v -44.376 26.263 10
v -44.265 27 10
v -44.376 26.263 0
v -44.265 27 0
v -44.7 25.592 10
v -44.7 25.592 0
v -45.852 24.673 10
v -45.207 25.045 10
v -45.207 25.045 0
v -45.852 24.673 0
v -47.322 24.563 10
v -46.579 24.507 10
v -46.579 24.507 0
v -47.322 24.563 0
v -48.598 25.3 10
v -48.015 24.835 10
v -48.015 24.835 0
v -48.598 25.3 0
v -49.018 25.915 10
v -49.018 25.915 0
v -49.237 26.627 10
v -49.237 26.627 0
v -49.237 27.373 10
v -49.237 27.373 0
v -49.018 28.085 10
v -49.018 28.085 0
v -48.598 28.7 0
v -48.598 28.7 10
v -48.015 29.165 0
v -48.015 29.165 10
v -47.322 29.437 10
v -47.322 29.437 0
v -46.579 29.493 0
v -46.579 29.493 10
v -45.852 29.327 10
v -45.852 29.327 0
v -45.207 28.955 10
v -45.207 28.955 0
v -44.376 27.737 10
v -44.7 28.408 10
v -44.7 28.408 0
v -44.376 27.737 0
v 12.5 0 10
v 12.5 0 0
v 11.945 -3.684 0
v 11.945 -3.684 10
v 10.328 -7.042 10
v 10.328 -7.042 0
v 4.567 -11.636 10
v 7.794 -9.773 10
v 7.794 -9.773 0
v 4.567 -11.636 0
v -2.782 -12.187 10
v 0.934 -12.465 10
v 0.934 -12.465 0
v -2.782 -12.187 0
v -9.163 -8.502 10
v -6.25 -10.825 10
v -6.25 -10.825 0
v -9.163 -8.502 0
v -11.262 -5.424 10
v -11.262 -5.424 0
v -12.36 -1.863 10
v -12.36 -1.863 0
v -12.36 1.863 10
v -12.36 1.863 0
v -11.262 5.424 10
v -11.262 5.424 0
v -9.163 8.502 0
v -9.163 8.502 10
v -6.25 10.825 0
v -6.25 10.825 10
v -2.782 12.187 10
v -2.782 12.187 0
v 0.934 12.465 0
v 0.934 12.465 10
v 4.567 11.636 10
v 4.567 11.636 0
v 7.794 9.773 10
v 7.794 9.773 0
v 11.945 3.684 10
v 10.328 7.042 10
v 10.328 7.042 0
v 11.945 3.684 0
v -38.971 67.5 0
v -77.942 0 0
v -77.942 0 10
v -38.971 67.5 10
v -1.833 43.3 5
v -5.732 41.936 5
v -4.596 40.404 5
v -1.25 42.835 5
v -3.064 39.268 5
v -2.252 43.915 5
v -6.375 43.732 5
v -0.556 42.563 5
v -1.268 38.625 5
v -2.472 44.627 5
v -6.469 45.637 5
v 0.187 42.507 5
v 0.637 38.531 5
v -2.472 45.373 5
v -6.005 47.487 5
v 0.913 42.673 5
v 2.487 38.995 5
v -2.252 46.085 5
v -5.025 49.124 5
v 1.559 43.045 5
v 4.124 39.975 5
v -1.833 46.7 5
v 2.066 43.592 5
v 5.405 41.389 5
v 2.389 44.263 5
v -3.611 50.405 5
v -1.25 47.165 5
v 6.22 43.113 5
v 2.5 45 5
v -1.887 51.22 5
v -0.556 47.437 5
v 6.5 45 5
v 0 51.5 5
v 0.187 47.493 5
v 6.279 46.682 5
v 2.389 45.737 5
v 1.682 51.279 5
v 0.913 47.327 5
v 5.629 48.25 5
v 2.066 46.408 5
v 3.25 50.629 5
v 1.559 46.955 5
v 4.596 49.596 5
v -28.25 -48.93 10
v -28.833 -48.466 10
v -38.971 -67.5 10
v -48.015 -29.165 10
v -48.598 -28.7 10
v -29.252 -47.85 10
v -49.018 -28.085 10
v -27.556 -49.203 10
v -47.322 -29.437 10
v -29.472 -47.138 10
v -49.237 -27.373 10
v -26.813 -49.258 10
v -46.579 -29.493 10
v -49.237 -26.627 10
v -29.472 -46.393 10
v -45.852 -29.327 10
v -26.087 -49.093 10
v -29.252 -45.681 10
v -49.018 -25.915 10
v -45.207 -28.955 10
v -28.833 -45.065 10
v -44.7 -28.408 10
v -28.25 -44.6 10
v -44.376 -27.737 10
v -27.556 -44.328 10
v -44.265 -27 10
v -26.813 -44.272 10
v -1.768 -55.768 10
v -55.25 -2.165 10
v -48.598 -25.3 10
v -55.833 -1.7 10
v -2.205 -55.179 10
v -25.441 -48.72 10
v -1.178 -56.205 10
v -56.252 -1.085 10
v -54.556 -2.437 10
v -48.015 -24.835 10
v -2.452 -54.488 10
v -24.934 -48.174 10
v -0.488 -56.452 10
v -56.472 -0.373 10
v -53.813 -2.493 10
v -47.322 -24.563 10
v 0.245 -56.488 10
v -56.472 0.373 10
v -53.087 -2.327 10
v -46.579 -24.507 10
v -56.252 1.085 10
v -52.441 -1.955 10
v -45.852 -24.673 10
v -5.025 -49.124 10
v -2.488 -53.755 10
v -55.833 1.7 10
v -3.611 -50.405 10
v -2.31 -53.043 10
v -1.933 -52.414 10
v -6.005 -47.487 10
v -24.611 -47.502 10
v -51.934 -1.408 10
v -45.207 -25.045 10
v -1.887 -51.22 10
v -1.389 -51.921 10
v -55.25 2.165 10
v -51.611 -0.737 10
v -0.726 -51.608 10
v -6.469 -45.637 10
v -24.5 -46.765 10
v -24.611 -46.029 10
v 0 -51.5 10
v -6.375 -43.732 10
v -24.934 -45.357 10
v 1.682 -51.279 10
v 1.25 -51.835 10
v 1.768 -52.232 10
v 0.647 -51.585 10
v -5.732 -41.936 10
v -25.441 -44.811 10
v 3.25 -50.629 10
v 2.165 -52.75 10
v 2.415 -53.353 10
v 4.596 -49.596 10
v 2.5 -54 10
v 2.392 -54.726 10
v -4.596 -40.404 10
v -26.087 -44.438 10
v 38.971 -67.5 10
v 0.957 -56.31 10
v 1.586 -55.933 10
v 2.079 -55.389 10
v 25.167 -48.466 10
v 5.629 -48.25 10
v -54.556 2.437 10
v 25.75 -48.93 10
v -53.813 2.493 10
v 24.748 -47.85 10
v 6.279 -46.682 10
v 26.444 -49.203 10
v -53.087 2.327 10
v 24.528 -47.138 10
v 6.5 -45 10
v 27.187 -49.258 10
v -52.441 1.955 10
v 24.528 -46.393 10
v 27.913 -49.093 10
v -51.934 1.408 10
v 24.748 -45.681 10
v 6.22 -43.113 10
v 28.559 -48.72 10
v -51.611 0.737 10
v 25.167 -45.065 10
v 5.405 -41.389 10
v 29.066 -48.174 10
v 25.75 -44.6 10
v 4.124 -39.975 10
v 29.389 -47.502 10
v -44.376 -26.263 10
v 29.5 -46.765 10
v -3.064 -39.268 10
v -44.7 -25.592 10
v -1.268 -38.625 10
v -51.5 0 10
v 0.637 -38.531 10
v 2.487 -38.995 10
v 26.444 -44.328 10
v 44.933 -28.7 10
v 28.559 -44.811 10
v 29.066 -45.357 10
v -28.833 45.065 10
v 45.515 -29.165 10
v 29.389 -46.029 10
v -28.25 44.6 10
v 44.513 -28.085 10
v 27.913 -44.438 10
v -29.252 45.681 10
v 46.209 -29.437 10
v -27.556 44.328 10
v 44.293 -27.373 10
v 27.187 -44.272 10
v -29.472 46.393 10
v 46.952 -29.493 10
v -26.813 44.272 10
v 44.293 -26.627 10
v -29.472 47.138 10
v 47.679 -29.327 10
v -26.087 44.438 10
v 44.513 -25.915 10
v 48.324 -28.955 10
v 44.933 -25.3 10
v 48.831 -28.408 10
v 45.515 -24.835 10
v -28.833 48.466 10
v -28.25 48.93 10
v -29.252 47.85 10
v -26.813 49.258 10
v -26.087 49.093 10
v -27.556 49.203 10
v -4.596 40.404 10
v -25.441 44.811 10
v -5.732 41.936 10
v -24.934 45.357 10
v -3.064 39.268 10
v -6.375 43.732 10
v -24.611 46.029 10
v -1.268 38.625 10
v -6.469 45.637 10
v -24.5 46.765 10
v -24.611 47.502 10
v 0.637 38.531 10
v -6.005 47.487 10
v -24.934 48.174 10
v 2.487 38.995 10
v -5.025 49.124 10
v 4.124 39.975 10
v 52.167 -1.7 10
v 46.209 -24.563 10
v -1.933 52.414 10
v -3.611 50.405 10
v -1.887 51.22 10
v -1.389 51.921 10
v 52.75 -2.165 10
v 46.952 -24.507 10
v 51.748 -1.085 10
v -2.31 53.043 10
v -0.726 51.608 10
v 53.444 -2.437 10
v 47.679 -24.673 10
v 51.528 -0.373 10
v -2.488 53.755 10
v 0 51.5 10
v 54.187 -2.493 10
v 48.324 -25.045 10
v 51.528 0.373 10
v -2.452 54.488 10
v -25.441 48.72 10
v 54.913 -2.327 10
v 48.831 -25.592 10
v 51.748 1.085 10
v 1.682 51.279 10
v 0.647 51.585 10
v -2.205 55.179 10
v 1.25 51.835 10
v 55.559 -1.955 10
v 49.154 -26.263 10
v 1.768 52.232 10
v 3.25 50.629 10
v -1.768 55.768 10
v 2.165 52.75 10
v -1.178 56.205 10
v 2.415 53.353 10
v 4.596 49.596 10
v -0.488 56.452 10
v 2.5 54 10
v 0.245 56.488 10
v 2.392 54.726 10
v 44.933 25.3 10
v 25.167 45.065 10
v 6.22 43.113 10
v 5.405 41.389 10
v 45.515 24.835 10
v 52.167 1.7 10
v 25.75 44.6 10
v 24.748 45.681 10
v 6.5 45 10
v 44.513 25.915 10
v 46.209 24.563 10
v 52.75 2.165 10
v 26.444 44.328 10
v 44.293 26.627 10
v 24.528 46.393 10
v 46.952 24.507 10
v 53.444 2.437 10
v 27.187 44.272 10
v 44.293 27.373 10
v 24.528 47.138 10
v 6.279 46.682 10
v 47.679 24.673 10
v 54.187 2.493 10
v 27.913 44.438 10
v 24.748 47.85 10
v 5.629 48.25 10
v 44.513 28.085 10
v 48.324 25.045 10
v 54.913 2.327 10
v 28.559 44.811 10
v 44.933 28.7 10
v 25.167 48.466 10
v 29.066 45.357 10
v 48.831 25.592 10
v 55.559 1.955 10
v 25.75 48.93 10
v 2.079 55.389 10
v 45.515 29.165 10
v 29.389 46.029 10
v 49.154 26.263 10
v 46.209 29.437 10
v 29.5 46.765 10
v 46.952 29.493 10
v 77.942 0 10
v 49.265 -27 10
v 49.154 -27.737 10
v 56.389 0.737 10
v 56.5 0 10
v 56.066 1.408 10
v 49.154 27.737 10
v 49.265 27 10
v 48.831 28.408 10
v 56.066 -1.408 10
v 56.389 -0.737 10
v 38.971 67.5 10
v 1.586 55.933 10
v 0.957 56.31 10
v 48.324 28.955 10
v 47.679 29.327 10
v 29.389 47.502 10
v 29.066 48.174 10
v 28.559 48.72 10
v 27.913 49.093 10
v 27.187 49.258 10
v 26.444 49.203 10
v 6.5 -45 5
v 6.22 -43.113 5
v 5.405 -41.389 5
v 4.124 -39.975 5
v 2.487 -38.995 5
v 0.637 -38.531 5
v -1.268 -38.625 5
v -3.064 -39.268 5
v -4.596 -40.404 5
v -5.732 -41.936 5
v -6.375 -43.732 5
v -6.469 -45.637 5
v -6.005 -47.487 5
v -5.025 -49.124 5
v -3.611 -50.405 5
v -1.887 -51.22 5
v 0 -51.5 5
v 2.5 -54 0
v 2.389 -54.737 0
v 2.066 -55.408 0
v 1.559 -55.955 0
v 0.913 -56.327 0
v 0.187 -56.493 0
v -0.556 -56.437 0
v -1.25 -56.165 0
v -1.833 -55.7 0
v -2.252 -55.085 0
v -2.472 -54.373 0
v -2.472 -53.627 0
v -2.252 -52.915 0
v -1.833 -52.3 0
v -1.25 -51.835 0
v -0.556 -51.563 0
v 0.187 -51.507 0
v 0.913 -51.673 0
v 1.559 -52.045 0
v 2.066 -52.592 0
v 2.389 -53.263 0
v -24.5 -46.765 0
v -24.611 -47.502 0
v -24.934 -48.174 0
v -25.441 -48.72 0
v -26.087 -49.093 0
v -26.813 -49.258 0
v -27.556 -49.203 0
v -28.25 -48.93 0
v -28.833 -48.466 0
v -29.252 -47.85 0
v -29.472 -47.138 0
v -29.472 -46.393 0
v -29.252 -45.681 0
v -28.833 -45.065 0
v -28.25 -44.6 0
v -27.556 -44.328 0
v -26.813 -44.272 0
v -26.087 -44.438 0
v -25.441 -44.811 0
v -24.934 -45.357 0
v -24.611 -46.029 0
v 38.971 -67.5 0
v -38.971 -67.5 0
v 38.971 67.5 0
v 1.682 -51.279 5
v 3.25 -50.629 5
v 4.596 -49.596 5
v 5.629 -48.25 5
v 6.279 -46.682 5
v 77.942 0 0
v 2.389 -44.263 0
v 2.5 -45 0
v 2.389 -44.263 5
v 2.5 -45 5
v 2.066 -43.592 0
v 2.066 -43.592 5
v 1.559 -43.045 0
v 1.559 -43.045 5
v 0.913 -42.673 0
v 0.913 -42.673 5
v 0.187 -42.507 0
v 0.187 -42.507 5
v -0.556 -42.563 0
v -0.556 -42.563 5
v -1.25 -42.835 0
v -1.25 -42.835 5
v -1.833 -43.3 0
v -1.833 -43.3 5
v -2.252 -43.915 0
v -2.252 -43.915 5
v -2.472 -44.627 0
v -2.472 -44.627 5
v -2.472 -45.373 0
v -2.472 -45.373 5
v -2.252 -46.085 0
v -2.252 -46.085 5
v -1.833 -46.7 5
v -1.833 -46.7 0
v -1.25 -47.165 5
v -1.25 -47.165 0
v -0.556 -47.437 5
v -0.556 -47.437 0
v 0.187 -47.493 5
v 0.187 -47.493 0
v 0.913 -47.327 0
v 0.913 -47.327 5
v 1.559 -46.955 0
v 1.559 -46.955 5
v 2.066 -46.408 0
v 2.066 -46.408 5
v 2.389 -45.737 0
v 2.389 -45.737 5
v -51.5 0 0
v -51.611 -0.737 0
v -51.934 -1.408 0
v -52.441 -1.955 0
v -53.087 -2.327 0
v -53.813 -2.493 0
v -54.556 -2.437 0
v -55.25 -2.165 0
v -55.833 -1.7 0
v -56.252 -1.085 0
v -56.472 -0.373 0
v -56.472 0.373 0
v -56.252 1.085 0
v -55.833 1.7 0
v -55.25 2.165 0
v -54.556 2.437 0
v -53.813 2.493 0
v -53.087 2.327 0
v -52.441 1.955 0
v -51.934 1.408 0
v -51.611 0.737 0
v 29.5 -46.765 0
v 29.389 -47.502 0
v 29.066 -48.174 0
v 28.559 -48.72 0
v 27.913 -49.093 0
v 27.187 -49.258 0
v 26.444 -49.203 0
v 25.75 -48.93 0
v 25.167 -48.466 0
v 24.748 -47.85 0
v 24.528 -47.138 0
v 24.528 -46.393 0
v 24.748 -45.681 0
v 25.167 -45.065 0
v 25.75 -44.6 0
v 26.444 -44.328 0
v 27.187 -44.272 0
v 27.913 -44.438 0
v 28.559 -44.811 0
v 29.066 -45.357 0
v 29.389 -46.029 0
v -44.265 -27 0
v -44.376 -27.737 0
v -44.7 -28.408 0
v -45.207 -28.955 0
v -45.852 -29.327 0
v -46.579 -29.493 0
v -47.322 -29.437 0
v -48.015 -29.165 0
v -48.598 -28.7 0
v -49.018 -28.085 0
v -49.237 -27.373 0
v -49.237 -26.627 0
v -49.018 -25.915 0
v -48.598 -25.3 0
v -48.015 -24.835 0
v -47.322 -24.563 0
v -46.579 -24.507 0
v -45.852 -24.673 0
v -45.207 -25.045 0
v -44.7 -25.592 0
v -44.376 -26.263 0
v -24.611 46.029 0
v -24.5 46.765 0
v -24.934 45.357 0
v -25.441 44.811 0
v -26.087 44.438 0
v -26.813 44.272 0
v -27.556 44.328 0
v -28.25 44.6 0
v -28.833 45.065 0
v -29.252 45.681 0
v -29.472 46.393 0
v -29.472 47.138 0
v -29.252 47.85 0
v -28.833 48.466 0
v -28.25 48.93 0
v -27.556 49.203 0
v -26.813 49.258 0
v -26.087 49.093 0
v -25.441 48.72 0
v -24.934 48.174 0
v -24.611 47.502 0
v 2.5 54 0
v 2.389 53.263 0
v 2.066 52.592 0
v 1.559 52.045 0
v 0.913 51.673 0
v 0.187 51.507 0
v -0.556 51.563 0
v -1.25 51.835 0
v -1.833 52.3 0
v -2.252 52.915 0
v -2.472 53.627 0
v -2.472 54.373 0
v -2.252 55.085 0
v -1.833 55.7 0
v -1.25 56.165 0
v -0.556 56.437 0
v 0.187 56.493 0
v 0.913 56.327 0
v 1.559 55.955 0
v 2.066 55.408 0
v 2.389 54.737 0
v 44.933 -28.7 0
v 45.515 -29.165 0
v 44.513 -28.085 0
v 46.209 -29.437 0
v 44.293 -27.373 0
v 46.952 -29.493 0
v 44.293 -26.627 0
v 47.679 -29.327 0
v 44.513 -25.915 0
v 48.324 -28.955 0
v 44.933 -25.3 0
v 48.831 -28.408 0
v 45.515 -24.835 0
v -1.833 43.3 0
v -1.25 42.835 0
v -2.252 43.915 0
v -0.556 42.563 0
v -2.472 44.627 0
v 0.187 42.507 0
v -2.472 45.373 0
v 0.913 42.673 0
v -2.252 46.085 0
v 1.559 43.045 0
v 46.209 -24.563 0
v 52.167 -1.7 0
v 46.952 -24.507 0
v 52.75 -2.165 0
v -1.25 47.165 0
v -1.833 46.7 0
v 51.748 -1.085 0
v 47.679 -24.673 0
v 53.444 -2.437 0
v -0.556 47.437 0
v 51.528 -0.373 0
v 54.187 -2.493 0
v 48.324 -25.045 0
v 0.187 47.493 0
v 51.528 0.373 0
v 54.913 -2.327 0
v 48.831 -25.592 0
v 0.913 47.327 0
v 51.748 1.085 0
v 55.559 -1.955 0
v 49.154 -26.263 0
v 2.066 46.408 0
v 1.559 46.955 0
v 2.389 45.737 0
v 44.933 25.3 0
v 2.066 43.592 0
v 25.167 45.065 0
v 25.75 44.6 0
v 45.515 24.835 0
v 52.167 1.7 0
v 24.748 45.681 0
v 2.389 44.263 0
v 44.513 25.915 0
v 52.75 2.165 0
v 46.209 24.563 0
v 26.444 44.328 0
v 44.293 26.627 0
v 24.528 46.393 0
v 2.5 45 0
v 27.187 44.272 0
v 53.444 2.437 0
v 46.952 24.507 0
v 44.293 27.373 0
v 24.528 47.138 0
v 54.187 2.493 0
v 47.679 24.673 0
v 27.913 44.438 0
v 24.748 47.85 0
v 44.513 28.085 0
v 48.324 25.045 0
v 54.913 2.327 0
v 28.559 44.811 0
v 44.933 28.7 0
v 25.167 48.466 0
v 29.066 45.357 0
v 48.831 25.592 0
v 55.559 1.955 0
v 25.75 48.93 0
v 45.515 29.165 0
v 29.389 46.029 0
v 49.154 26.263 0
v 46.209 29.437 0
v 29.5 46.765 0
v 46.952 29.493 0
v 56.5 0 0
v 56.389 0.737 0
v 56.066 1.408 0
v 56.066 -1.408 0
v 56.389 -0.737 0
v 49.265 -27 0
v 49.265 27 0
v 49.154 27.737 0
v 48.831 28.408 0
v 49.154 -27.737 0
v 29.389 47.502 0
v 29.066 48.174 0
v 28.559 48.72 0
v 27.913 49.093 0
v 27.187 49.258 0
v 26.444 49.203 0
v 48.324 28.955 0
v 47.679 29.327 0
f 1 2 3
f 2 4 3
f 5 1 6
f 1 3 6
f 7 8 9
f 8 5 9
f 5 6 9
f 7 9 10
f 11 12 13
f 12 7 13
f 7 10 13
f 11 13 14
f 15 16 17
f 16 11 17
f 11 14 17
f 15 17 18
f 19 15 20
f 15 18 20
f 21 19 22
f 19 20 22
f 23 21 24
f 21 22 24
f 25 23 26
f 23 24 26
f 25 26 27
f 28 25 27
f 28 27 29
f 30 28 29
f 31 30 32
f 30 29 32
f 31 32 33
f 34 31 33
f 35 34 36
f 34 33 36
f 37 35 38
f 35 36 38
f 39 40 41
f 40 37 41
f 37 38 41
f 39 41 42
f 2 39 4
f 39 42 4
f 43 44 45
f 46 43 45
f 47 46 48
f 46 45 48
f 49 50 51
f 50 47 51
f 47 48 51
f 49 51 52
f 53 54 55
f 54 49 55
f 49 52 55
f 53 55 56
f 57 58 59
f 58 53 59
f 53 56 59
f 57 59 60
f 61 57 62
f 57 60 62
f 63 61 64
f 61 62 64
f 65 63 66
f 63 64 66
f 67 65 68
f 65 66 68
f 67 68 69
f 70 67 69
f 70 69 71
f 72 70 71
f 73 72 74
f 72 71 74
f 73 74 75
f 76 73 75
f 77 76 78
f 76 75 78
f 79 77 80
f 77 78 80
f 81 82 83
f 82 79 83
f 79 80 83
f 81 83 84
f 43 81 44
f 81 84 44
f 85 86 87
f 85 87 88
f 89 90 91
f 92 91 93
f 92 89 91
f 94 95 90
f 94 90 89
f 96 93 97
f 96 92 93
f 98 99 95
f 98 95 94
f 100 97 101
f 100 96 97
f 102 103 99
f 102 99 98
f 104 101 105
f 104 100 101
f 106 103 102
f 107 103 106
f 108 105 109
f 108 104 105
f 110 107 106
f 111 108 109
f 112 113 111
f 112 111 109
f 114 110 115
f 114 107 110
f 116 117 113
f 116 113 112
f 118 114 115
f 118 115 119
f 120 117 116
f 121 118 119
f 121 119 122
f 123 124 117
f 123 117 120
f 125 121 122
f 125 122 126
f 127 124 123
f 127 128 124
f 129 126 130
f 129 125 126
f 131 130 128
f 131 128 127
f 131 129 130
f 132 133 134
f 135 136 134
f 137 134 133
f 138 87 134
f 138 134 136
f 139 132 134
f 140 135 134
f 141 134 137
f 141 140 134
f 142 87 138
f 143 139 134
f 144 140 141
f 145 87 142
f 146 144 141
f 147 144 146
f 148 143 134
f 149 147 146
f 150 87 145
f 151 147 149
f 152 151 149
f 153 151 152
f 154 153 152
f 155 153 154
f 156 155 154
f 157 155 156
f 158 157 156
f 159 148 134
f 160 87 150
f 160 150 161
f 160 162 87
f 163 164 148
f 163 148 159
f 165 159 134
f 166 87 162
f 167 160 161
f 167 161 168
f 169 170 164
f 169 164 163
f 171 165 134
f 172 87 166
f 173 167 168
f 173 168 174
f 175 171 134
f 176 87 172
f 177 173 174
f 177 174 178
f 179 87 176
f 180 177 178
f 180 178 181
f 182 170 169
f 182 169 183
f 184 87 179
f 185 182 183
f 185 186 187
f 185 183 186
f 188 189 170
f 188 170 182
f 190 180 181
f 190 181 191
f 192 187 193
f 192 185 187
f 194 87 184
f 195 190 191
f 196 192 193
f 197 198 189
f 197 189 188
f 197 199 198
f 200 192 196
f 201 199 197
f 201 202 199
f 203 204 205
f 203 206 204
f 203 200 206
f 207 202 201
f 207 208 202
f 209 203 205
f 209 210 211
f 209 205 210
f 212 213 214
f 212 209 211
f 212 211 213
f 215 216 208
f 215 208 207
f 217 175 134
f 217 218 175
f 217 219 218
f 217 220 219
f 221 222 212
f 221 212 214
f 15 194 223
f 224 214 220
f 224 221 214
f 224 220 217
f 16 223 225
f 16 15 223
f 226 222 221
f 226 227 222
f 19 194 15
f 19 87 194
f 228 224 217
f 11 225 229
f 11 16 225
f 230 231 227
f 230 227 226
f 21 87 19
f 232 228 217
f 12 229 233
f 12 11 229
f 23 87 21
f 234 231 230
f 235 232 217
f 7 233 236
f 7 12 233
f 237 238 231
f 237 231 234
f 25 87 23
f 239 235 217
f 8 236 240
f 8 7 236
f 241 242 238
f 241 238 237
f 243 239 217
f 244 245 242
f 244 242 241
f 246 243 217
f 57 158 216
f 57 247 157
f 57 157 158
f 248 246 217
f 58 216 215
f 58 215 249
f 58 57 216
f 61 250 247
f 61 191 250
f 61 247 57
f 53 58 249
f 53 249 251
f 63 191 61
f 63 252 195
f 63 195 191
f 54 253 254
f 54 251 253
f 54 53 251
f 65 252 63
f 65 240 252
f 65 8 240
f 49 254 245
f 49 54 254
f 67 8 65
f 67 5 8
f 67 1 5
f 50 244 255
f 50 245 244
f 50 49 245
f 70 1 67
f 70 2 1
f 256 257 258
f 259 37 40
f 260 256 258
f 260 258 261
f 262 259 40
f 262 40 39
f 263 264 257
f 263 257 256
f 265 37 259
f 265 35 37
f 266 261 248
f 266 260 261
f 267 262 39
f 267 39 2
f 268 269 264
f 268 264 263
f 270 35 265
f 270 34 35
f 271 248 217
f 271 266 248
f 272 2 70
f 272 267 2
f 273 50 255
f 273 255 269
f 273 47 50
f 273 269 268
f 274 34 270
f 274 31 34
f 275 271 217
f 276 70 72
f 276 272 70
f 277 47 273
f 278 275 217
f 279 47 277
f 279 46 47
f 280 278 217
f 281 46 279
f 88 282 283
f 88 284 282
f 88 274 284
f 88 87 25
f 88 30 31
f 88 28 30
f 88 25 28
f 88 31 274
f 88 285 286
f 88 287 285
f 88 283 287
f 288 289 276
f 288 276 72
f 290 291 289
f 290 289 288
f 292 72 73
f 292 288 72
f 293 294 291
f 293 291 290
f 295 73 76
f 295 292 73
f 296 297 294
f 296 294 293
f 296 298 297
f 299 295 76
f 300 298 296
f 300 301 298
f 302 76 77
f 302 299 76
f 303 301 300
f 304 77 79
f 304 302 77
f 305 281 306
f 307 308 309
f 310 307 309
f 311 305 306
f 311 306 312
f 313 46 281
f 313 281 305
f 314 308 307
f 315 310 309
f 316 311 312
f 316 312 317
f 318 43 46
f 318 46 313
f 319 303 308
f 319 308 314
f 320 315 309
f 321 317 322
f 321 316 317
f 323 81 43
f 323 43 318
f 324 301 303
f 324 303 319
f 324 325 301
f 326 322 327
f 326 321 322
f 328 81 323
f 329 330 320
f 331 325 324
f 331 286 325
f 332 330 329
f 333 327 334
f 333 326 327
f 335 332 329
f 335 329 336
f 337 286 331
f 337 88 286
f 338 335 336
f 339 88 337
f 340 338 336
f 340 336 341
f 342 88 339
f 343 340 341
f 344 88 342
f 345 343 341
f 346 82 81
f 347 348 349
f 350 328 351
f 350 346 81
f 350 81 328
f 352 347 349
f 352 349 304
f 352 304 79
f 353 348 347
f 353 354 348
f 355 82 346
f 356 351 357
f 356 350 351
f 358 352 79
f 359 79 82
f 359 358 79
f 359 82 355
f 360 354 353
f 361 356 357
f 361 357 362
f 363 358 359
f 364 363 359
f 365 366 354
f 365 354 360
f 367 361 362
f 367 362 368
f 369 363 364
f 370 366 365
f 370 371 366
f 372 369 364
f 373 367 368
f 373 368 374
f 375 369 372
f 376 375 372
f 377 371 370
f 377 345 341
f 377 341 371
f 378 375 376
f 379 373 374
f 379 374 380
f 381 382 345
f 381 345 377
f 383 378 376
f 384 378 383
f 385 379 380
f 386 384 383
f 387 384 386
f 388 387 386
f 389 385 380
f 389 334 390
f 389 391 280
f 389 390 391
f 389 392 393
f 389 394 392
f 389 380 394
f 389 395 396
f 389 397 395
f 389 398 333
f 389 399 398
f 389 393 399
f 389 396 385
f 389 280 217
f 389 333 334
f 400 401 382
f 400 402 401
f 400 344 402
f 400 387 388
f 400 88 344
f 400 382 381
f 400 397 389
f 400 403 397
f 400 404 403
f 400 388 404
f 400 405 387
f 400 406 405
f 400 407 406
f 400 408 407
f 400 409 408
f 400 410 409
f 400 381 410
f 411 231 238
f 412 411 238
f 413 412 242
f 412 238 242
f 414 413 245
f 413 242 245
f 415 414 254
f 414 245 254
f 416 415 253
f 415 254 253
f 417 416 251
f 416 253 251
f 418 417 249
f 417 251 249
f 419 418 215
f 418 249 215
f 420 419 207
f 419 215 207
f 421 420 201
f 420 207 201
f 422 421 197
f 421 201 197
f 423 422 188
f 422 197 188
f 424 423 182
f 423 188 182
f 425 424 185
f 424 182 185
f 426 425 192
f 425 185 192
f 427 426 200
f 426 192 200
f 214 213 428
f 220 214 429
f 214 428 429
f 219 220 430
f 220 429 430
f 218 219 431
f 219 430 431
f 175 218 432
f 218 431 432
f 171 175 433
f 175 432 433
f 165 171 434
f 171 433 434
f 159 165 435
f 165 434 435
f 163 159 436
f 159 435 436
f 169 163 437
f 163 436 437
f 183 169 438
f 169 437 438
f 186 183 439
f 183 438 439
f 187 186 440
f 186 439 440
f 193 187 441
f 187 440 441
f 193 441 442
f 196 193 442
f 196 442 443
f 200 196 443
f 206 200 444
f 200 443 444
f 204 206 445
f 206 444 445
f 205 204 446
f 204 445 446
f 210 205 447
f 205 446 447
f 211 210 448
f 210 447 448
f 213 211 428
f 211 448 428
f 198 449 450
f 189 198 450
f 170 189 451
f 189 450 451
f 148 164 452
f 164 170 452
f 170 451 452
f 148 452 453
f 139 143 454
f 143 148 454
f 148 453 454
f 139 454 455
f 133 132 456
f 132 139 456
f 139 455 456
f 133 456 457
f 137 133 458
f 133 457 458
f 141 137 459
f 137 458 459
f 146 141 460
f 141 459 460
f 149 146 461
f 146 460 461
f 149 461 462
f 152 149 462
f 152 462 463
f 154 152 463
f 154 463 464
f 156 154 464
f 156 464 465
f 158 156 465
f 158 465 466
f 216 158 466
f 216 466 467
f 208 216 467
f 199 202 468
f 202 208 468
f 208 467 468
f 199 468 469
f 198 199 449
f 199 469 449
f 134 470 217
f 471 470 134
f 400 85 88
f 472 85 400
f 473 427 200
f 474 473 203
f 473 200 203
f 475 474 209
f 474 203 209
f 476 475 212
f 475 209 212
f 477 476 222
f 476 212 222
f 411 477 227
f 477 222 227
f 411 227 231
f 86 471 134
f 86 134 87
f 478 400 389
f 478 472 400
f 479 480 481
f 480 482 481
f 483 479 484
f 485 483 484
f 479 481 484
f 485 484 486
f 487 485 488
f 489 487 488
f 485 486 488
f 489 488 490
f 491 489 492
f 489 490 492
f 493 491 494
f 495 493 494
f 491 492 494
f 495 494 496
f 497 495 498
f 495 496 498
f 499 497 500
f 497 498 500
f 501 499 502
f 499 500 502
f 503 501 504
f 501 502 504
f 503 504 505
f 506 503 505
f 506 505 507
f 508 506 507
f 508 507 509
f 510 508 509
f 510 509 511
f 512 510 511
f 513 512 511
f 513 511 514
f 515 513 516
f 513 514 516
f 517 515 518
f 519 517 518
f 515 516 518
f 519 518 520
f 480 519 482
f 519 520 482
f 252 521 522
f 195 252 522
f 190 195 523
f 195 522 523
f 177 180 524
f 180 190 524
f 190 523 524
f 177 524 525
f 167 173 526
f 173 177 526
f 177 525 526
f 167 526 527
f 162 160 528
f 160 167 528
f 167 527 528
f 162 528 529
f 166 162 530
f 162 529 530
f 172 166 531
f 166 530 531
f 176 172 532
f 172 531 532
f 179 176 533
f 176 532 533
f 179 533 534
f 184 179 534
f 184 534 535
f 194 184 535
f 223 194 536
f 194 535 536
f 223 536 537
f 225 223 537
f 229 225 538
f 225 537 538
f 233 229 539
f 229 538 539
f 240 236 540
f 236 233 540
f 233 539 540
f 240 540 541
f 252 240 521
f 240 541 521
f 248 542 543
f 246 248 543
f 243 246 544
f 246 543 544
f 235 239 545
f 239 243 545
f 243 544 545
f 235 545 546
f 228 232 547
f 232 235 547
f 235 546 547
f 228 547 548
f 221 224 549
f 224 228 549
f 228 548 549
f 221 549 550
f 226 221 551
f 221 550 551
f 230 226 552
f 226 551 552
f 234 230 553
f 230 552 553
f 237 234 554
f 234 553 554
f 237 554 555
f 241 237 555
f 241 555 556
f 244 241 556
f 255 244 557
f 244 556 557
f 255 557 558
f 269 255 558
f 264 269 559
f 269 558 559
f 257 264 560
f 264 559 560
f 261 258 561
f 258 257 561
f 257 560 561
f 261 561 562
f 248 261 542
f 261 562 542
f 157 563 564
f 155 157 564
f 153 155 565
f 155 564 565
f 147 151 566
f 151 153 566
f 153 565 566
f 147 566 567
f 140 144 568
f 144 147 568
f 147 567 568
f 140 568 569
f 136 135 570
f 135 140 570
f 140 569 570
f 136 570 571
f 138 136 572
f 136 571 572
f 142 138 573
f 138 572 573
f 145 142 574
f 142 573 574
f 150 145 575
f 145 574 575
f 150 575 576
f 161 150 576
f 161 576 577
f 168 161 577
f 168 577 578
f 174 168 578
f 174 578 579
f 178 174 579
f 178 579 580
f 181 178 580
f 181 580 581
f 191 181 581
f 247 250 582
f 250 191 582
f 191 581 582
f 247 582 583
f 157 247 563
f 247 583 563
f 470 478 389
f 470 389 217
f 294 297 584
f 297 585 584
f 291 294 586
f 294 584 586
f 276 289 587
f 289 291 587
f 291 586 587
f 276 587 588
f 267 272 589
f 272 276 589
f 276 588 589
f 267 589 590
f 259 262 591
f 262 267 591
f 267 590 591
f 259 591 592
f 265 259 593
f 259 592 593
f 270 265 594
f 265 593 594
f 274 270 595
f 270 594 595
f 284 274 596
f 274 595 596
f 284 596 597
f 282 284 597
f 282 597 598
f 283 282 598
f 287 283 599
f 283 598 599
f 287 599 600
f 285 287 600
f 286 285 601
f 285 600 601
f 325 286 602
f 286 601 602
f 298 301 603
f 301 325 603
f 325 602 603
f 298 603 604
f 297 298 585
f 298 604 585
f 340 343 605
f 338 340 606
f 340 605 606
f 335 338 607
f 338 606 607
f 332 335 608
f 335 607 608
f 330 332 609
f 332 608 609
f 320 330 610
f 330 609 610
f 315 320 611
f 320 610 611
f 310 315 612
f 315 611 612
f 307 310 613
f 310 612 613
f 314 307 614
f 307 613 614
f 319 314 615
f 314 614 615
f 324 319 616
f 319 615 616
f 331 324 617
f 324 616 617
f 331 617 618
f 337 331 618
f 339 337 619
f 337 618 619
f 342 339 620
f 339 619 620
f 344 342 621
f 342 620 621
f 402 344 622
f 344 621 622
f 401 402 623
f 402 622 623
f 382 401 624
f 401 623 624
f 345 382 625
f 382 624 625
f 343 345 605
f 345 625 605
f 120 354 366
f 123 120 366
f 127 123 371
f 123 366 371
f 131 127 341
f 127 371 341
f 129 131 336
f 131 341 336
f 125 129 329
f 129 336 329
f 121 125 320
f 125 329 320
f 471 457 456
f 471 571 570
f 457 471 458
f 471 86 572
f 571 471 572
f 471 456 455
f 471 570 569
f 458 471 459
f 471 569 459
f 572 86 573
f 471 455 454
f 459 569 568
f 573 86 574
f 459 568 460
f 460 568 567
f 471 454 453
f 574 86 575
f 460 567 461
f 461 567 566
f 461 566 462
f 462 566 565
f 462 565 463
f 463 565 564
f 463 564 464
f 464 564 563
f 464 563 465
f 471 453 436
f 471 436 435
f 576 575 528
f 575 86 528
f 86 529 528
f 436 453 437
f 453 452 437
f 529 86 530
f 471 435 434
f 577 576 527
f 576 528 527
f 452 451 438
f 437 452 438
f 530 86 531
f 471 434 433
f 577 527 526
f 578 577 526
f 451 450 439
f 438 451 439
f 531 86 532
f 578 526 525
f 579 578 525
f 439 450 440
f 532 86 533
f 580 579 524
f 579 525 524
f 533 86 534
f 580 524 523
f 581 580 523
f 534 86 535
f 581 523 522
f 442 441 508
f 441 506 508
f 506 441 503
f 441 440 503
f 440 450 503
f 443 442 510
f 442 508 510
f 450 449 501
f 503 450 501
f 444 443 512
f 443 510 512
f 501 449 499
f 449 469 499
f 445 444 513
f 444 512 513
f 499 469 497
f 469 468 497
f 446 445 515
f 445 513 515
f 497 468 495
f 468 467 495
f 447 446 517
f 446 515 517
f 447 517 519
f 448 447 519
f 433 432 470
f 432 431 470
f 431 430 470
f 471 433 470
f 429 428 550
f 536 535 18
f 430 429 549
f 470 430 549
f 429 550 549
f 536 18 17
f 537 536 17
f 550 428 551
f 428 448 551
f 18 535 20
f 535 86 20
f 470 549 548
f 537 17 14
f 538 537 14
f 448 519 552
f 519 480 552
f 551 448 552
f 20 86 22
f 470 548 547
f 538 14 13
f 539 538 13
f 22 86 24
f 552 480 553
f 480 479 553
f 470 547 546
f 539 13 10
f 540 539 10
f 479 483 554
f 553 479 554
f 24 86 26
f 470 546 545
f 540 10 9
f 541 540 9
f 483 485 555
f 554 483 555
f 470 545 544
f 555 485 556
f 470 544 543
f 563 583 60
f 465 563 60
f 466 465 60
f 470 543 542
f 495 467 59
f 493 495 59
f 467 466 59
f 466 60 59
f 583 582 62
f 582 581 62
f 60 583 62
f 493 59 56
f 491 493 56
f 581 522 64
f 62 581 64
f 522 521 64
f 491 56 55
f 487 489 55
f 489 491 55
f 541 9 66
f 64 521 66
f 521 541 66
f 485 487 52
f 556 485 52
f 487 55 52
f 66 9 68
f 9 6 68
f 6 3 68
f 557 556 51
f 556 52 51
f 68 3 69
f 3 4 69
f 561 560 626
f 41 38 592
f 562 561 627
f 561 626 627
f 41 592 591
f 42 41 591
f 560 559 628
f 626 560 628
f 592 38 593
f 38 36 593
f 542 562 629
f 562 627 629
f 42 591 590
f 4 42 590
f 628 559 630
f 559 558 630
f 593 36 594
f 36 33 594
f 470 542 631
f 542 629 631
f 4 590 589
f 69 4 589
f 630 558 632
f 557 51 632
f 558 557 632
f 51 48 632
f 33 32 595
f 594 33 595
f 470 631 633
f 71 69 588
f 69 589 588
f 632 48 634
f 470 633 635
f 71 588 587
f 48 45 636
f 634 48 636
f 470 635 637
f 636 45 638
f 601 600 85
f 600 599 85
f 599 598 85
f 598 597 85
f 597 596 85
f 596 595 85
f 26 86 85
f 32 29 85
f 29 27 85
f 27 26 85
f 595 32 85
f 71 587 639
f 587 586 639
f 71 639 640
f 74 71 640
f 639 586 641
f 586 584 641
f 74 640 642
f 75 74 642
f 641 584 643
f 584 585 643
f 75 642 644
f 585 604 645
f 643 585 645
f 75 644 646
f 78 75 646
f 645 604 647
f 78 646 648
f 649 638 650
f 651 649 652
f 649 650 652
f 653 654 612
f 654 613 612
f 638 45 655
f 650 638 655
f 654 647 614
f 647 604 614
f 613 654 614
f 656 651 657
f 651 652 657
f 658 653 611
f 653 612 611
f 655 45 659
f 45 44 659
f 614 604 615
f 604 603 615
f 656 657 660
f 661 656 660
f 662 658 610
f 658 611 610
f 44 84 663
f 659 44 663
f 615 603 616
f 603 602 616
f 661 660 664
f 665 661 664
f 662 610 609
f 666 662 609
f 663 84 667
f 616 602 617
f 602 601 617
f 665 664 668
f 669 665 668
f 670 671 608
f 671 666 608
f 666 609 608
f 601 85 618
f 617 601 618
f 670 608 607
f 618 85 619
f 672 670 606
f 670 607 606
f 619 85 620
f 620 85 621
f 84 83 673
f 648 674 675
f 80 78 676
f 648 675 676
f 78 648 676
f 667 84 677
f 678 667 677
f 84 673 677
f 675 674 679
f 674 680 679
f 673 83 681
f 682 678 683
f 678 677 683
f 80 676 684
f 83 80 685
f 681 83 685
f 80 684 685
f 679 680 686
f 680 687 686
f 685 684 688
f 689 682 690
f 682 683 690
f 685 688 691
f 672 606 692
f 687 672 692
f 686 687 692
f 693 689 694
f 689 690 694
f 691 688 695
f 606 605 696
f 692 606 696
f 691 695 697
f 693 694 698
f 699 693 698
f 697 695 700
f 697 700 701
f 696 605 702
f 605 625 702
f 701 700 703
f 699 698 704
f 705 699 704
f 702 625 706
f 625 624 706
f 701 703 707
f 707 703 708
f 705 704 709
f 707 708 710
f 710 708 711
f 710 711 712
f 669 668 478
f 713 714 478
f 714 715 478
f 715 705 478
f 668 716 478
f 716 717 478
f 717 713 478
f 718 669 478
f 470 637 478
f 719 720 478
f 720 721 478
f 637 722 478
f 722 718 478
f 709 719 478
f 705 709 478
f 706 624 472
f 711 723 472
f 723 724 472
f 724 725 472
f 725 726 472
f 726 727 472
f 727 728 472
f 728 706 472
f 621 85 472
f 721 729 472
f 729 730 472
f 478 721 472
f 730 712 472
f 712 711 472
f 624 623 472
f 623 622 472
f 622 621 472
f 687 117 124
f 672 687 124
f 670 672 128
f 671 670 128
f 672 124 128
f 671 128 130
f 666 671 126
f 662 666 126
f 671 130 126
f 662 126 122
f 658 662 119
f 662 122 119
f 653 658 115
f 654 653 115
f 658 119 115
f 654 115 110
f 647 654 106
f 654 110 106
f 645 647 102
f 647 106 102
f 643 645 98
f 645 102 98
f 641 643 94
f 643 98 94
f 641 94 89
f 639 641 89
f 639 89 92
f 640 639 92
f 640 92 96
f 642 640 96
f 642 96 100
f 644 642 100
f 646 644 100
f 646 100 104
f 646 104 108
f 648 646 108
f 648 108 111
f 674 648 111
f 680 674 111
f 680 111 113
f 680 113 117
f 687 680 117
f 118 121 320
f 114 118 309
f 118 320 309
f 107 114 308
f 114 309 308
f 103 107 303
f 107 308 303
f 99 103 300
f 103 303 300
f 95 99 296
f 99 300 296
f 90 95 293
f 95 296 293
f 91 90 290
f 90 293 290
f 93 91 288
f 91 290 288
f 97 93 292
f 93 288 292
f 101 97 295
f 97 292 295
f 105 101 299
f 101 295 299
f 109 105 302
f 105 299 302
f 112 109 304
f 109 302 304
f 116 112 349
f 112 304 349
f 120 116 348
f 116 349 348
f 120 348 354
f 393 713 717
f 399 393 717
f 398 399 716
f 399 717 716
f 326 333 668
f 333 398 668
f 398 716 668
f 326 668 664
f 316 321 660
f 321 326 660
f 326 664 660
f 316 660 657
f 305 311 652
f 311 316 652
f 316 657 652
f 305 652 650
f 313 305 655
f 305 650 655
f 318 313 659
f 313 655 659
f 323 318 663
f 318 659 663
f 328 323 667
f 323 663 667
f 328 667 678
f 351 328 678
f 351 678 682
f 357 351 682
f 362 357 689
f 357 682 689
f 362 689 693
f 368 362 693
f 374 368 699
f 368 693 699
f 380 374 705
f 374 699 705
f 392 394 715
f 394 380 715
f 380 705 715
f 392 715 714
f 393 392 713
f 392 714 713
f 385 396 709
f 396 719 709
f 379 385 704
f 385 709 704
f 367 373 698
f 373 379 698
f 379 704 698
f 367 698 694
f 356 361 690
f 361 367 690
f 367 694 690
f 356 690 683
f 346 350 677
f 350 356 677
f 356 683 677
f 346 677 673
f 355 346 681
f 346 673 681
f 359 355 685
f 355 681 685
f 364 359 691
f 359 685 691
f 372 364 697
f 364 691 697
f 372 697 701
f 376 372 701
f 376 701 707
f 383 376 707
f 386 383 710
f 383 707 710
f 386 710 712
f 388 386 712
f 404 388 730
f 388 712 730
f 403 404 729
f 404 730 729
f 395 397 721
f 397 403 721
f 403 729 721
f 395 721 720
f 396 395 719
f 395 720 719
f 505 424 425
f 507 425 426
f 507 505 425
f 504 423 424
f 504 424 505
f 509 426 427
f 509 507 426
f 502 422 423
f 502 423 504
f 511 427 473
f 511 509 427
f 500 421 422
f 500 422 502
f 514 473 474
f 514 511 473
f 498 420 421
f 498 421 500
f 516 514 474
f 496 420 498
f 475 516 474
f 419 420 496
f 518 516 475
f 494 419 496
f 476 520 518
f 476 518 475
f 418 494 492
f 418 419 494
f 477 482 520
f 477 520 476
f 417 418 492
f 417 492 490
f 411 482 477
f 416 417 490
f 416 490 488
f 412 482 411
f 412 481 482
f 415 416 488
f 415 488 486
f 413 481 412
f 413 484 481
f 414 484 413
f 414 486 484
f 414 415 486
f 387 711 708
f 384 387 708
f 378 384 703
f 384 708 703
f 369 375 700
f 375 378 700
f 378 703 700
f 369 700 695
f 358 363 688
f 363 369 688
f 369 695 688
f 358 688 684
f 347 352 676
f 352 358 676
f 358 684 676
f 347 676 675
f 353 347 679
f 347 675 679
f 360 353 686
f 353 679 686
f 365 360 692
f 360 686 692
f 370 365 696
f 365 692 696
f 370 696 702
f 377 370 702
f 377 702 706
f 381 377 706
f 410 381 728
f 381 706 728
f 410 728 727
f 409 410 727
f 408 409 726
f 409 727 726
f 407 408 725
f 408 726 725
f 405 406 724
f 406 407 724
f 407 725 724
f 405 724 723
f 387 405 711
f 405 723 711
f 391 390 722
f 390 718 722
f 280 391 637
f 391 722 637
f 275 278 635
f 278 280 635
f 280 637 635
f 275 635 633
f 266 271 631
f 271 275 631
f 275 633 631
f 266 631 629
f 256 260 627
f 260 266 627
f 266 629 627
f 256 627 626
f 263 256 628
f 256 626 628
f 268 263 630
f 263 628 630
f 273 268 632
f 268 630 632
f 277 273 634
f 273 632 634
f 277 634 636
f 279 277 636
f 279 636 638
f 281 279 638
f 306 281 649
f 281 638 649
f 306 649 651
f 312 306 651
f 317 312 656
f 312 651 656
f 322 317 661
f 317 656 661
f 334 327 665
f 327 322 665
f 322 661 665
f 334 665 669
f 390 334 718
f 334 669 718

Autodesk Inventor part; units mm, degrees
ref_plane "YZ Plane" through (0, 0, 0) normal (1, 0, 0) x (0, 1, 0)
ref_plane "XZ Plane" through (0, 0, 0) normal (0, 1, 0) x (-1, 0, 0)
ref_plane "XY Plane" through (0, 0, 0) normal (0, 0, 1) x (1, 0, 0)
sketch "Sketch1" plane through (0, 0, 0) normal (0, 0, 1) x (1, 0, 0)
  line L0 (77.9423, 0) -> (38.9711, -67.5)
  line L1 (38.9711, -67.5) -> (-38.9711, -67.5)
  line L2 (-38.9711, -67.5) -> (-77.9423, 0)
  line L3 (-77.9423, 0) -> (-38.9711, 67.5)
  line L4 (-38.9711, 67.5) -> (38.9711, 67.5)
  line L5 (38.9711, 67.5) -> (77.9423, 0)
  circle A0 centre (0, 0) radius 12.5
  circle A1 centre (54, 0) radius 2.5
  circle A2 centre (46.7654, 27) radius 2.5
  circle A3 centre (27, 46.7654) radius 2.5
  circle A4 centre (0, 54) radius 2.5
  circle A5 centre (-27, 46.7654) radius 2.5
  circle A6 centre (-46.7654, 27) radius 2.5
  circle A7 centre (-54, 0) radius 2.5
  circle A8 centre (-46.7654, -27) radius 2.5
  circle A9 centre (-27, -46.7654) radius 2.5
  circle A10 centre (0, -54) radius 2.5
  circle A11 centre (27, -46.7654) radius 2.5
  circle A12 centre (46.7654, -27) radius 2.5
  dimension "d0" = 135
  dimension "d1" = 25
  dimension "d2" = 54
  dimension "d3" = 5
  dimension "d6" = 360
extrude "Extrusion1" add sketch "Sketch1" along normal blind 10
sketch "Sketch2" plane through (0, 0, 10) normal (0, 0, 1) x (1, 0, 0)
  circle A0 centre (0, 45) radius 2.5
  circle A1 centre (-45, 0) radius 2.5
  circle A2 centre (0, -45) radius 2.5
  circle A3 centre (45, 0) radius 2.5
  point P0 (0, 0)
  dimension "d10" = 5
  dimension "d11" = 45
  dimension "d14" = 360
extrude "Extrusion2" cut sketch "Sketch2" against normal through all contours A0 | A2
sketch "Sketch4" plane through (0, 0, 10) normal (0, 0, 1) x (1, 0, 0)
  circle A0 centre (0, 45) radius 2.5 projected
  circle A1 centre (0, 45) radius 6.5
  circle A2 centre (-45, 0) radius 6.5
  circle A3 centre (0, -45) radius 6.5
  circle A4 centre (45, 0) radius 6.5
  point P0 (0, 0)
  dimension "d22" = 13
  dimension "d28" = 360
extrude "Extrusion4" cut sketch "Sketch4" against normal blind 5 contours A1 | A3
properties part number "AC04" material "ABS Plastic"
